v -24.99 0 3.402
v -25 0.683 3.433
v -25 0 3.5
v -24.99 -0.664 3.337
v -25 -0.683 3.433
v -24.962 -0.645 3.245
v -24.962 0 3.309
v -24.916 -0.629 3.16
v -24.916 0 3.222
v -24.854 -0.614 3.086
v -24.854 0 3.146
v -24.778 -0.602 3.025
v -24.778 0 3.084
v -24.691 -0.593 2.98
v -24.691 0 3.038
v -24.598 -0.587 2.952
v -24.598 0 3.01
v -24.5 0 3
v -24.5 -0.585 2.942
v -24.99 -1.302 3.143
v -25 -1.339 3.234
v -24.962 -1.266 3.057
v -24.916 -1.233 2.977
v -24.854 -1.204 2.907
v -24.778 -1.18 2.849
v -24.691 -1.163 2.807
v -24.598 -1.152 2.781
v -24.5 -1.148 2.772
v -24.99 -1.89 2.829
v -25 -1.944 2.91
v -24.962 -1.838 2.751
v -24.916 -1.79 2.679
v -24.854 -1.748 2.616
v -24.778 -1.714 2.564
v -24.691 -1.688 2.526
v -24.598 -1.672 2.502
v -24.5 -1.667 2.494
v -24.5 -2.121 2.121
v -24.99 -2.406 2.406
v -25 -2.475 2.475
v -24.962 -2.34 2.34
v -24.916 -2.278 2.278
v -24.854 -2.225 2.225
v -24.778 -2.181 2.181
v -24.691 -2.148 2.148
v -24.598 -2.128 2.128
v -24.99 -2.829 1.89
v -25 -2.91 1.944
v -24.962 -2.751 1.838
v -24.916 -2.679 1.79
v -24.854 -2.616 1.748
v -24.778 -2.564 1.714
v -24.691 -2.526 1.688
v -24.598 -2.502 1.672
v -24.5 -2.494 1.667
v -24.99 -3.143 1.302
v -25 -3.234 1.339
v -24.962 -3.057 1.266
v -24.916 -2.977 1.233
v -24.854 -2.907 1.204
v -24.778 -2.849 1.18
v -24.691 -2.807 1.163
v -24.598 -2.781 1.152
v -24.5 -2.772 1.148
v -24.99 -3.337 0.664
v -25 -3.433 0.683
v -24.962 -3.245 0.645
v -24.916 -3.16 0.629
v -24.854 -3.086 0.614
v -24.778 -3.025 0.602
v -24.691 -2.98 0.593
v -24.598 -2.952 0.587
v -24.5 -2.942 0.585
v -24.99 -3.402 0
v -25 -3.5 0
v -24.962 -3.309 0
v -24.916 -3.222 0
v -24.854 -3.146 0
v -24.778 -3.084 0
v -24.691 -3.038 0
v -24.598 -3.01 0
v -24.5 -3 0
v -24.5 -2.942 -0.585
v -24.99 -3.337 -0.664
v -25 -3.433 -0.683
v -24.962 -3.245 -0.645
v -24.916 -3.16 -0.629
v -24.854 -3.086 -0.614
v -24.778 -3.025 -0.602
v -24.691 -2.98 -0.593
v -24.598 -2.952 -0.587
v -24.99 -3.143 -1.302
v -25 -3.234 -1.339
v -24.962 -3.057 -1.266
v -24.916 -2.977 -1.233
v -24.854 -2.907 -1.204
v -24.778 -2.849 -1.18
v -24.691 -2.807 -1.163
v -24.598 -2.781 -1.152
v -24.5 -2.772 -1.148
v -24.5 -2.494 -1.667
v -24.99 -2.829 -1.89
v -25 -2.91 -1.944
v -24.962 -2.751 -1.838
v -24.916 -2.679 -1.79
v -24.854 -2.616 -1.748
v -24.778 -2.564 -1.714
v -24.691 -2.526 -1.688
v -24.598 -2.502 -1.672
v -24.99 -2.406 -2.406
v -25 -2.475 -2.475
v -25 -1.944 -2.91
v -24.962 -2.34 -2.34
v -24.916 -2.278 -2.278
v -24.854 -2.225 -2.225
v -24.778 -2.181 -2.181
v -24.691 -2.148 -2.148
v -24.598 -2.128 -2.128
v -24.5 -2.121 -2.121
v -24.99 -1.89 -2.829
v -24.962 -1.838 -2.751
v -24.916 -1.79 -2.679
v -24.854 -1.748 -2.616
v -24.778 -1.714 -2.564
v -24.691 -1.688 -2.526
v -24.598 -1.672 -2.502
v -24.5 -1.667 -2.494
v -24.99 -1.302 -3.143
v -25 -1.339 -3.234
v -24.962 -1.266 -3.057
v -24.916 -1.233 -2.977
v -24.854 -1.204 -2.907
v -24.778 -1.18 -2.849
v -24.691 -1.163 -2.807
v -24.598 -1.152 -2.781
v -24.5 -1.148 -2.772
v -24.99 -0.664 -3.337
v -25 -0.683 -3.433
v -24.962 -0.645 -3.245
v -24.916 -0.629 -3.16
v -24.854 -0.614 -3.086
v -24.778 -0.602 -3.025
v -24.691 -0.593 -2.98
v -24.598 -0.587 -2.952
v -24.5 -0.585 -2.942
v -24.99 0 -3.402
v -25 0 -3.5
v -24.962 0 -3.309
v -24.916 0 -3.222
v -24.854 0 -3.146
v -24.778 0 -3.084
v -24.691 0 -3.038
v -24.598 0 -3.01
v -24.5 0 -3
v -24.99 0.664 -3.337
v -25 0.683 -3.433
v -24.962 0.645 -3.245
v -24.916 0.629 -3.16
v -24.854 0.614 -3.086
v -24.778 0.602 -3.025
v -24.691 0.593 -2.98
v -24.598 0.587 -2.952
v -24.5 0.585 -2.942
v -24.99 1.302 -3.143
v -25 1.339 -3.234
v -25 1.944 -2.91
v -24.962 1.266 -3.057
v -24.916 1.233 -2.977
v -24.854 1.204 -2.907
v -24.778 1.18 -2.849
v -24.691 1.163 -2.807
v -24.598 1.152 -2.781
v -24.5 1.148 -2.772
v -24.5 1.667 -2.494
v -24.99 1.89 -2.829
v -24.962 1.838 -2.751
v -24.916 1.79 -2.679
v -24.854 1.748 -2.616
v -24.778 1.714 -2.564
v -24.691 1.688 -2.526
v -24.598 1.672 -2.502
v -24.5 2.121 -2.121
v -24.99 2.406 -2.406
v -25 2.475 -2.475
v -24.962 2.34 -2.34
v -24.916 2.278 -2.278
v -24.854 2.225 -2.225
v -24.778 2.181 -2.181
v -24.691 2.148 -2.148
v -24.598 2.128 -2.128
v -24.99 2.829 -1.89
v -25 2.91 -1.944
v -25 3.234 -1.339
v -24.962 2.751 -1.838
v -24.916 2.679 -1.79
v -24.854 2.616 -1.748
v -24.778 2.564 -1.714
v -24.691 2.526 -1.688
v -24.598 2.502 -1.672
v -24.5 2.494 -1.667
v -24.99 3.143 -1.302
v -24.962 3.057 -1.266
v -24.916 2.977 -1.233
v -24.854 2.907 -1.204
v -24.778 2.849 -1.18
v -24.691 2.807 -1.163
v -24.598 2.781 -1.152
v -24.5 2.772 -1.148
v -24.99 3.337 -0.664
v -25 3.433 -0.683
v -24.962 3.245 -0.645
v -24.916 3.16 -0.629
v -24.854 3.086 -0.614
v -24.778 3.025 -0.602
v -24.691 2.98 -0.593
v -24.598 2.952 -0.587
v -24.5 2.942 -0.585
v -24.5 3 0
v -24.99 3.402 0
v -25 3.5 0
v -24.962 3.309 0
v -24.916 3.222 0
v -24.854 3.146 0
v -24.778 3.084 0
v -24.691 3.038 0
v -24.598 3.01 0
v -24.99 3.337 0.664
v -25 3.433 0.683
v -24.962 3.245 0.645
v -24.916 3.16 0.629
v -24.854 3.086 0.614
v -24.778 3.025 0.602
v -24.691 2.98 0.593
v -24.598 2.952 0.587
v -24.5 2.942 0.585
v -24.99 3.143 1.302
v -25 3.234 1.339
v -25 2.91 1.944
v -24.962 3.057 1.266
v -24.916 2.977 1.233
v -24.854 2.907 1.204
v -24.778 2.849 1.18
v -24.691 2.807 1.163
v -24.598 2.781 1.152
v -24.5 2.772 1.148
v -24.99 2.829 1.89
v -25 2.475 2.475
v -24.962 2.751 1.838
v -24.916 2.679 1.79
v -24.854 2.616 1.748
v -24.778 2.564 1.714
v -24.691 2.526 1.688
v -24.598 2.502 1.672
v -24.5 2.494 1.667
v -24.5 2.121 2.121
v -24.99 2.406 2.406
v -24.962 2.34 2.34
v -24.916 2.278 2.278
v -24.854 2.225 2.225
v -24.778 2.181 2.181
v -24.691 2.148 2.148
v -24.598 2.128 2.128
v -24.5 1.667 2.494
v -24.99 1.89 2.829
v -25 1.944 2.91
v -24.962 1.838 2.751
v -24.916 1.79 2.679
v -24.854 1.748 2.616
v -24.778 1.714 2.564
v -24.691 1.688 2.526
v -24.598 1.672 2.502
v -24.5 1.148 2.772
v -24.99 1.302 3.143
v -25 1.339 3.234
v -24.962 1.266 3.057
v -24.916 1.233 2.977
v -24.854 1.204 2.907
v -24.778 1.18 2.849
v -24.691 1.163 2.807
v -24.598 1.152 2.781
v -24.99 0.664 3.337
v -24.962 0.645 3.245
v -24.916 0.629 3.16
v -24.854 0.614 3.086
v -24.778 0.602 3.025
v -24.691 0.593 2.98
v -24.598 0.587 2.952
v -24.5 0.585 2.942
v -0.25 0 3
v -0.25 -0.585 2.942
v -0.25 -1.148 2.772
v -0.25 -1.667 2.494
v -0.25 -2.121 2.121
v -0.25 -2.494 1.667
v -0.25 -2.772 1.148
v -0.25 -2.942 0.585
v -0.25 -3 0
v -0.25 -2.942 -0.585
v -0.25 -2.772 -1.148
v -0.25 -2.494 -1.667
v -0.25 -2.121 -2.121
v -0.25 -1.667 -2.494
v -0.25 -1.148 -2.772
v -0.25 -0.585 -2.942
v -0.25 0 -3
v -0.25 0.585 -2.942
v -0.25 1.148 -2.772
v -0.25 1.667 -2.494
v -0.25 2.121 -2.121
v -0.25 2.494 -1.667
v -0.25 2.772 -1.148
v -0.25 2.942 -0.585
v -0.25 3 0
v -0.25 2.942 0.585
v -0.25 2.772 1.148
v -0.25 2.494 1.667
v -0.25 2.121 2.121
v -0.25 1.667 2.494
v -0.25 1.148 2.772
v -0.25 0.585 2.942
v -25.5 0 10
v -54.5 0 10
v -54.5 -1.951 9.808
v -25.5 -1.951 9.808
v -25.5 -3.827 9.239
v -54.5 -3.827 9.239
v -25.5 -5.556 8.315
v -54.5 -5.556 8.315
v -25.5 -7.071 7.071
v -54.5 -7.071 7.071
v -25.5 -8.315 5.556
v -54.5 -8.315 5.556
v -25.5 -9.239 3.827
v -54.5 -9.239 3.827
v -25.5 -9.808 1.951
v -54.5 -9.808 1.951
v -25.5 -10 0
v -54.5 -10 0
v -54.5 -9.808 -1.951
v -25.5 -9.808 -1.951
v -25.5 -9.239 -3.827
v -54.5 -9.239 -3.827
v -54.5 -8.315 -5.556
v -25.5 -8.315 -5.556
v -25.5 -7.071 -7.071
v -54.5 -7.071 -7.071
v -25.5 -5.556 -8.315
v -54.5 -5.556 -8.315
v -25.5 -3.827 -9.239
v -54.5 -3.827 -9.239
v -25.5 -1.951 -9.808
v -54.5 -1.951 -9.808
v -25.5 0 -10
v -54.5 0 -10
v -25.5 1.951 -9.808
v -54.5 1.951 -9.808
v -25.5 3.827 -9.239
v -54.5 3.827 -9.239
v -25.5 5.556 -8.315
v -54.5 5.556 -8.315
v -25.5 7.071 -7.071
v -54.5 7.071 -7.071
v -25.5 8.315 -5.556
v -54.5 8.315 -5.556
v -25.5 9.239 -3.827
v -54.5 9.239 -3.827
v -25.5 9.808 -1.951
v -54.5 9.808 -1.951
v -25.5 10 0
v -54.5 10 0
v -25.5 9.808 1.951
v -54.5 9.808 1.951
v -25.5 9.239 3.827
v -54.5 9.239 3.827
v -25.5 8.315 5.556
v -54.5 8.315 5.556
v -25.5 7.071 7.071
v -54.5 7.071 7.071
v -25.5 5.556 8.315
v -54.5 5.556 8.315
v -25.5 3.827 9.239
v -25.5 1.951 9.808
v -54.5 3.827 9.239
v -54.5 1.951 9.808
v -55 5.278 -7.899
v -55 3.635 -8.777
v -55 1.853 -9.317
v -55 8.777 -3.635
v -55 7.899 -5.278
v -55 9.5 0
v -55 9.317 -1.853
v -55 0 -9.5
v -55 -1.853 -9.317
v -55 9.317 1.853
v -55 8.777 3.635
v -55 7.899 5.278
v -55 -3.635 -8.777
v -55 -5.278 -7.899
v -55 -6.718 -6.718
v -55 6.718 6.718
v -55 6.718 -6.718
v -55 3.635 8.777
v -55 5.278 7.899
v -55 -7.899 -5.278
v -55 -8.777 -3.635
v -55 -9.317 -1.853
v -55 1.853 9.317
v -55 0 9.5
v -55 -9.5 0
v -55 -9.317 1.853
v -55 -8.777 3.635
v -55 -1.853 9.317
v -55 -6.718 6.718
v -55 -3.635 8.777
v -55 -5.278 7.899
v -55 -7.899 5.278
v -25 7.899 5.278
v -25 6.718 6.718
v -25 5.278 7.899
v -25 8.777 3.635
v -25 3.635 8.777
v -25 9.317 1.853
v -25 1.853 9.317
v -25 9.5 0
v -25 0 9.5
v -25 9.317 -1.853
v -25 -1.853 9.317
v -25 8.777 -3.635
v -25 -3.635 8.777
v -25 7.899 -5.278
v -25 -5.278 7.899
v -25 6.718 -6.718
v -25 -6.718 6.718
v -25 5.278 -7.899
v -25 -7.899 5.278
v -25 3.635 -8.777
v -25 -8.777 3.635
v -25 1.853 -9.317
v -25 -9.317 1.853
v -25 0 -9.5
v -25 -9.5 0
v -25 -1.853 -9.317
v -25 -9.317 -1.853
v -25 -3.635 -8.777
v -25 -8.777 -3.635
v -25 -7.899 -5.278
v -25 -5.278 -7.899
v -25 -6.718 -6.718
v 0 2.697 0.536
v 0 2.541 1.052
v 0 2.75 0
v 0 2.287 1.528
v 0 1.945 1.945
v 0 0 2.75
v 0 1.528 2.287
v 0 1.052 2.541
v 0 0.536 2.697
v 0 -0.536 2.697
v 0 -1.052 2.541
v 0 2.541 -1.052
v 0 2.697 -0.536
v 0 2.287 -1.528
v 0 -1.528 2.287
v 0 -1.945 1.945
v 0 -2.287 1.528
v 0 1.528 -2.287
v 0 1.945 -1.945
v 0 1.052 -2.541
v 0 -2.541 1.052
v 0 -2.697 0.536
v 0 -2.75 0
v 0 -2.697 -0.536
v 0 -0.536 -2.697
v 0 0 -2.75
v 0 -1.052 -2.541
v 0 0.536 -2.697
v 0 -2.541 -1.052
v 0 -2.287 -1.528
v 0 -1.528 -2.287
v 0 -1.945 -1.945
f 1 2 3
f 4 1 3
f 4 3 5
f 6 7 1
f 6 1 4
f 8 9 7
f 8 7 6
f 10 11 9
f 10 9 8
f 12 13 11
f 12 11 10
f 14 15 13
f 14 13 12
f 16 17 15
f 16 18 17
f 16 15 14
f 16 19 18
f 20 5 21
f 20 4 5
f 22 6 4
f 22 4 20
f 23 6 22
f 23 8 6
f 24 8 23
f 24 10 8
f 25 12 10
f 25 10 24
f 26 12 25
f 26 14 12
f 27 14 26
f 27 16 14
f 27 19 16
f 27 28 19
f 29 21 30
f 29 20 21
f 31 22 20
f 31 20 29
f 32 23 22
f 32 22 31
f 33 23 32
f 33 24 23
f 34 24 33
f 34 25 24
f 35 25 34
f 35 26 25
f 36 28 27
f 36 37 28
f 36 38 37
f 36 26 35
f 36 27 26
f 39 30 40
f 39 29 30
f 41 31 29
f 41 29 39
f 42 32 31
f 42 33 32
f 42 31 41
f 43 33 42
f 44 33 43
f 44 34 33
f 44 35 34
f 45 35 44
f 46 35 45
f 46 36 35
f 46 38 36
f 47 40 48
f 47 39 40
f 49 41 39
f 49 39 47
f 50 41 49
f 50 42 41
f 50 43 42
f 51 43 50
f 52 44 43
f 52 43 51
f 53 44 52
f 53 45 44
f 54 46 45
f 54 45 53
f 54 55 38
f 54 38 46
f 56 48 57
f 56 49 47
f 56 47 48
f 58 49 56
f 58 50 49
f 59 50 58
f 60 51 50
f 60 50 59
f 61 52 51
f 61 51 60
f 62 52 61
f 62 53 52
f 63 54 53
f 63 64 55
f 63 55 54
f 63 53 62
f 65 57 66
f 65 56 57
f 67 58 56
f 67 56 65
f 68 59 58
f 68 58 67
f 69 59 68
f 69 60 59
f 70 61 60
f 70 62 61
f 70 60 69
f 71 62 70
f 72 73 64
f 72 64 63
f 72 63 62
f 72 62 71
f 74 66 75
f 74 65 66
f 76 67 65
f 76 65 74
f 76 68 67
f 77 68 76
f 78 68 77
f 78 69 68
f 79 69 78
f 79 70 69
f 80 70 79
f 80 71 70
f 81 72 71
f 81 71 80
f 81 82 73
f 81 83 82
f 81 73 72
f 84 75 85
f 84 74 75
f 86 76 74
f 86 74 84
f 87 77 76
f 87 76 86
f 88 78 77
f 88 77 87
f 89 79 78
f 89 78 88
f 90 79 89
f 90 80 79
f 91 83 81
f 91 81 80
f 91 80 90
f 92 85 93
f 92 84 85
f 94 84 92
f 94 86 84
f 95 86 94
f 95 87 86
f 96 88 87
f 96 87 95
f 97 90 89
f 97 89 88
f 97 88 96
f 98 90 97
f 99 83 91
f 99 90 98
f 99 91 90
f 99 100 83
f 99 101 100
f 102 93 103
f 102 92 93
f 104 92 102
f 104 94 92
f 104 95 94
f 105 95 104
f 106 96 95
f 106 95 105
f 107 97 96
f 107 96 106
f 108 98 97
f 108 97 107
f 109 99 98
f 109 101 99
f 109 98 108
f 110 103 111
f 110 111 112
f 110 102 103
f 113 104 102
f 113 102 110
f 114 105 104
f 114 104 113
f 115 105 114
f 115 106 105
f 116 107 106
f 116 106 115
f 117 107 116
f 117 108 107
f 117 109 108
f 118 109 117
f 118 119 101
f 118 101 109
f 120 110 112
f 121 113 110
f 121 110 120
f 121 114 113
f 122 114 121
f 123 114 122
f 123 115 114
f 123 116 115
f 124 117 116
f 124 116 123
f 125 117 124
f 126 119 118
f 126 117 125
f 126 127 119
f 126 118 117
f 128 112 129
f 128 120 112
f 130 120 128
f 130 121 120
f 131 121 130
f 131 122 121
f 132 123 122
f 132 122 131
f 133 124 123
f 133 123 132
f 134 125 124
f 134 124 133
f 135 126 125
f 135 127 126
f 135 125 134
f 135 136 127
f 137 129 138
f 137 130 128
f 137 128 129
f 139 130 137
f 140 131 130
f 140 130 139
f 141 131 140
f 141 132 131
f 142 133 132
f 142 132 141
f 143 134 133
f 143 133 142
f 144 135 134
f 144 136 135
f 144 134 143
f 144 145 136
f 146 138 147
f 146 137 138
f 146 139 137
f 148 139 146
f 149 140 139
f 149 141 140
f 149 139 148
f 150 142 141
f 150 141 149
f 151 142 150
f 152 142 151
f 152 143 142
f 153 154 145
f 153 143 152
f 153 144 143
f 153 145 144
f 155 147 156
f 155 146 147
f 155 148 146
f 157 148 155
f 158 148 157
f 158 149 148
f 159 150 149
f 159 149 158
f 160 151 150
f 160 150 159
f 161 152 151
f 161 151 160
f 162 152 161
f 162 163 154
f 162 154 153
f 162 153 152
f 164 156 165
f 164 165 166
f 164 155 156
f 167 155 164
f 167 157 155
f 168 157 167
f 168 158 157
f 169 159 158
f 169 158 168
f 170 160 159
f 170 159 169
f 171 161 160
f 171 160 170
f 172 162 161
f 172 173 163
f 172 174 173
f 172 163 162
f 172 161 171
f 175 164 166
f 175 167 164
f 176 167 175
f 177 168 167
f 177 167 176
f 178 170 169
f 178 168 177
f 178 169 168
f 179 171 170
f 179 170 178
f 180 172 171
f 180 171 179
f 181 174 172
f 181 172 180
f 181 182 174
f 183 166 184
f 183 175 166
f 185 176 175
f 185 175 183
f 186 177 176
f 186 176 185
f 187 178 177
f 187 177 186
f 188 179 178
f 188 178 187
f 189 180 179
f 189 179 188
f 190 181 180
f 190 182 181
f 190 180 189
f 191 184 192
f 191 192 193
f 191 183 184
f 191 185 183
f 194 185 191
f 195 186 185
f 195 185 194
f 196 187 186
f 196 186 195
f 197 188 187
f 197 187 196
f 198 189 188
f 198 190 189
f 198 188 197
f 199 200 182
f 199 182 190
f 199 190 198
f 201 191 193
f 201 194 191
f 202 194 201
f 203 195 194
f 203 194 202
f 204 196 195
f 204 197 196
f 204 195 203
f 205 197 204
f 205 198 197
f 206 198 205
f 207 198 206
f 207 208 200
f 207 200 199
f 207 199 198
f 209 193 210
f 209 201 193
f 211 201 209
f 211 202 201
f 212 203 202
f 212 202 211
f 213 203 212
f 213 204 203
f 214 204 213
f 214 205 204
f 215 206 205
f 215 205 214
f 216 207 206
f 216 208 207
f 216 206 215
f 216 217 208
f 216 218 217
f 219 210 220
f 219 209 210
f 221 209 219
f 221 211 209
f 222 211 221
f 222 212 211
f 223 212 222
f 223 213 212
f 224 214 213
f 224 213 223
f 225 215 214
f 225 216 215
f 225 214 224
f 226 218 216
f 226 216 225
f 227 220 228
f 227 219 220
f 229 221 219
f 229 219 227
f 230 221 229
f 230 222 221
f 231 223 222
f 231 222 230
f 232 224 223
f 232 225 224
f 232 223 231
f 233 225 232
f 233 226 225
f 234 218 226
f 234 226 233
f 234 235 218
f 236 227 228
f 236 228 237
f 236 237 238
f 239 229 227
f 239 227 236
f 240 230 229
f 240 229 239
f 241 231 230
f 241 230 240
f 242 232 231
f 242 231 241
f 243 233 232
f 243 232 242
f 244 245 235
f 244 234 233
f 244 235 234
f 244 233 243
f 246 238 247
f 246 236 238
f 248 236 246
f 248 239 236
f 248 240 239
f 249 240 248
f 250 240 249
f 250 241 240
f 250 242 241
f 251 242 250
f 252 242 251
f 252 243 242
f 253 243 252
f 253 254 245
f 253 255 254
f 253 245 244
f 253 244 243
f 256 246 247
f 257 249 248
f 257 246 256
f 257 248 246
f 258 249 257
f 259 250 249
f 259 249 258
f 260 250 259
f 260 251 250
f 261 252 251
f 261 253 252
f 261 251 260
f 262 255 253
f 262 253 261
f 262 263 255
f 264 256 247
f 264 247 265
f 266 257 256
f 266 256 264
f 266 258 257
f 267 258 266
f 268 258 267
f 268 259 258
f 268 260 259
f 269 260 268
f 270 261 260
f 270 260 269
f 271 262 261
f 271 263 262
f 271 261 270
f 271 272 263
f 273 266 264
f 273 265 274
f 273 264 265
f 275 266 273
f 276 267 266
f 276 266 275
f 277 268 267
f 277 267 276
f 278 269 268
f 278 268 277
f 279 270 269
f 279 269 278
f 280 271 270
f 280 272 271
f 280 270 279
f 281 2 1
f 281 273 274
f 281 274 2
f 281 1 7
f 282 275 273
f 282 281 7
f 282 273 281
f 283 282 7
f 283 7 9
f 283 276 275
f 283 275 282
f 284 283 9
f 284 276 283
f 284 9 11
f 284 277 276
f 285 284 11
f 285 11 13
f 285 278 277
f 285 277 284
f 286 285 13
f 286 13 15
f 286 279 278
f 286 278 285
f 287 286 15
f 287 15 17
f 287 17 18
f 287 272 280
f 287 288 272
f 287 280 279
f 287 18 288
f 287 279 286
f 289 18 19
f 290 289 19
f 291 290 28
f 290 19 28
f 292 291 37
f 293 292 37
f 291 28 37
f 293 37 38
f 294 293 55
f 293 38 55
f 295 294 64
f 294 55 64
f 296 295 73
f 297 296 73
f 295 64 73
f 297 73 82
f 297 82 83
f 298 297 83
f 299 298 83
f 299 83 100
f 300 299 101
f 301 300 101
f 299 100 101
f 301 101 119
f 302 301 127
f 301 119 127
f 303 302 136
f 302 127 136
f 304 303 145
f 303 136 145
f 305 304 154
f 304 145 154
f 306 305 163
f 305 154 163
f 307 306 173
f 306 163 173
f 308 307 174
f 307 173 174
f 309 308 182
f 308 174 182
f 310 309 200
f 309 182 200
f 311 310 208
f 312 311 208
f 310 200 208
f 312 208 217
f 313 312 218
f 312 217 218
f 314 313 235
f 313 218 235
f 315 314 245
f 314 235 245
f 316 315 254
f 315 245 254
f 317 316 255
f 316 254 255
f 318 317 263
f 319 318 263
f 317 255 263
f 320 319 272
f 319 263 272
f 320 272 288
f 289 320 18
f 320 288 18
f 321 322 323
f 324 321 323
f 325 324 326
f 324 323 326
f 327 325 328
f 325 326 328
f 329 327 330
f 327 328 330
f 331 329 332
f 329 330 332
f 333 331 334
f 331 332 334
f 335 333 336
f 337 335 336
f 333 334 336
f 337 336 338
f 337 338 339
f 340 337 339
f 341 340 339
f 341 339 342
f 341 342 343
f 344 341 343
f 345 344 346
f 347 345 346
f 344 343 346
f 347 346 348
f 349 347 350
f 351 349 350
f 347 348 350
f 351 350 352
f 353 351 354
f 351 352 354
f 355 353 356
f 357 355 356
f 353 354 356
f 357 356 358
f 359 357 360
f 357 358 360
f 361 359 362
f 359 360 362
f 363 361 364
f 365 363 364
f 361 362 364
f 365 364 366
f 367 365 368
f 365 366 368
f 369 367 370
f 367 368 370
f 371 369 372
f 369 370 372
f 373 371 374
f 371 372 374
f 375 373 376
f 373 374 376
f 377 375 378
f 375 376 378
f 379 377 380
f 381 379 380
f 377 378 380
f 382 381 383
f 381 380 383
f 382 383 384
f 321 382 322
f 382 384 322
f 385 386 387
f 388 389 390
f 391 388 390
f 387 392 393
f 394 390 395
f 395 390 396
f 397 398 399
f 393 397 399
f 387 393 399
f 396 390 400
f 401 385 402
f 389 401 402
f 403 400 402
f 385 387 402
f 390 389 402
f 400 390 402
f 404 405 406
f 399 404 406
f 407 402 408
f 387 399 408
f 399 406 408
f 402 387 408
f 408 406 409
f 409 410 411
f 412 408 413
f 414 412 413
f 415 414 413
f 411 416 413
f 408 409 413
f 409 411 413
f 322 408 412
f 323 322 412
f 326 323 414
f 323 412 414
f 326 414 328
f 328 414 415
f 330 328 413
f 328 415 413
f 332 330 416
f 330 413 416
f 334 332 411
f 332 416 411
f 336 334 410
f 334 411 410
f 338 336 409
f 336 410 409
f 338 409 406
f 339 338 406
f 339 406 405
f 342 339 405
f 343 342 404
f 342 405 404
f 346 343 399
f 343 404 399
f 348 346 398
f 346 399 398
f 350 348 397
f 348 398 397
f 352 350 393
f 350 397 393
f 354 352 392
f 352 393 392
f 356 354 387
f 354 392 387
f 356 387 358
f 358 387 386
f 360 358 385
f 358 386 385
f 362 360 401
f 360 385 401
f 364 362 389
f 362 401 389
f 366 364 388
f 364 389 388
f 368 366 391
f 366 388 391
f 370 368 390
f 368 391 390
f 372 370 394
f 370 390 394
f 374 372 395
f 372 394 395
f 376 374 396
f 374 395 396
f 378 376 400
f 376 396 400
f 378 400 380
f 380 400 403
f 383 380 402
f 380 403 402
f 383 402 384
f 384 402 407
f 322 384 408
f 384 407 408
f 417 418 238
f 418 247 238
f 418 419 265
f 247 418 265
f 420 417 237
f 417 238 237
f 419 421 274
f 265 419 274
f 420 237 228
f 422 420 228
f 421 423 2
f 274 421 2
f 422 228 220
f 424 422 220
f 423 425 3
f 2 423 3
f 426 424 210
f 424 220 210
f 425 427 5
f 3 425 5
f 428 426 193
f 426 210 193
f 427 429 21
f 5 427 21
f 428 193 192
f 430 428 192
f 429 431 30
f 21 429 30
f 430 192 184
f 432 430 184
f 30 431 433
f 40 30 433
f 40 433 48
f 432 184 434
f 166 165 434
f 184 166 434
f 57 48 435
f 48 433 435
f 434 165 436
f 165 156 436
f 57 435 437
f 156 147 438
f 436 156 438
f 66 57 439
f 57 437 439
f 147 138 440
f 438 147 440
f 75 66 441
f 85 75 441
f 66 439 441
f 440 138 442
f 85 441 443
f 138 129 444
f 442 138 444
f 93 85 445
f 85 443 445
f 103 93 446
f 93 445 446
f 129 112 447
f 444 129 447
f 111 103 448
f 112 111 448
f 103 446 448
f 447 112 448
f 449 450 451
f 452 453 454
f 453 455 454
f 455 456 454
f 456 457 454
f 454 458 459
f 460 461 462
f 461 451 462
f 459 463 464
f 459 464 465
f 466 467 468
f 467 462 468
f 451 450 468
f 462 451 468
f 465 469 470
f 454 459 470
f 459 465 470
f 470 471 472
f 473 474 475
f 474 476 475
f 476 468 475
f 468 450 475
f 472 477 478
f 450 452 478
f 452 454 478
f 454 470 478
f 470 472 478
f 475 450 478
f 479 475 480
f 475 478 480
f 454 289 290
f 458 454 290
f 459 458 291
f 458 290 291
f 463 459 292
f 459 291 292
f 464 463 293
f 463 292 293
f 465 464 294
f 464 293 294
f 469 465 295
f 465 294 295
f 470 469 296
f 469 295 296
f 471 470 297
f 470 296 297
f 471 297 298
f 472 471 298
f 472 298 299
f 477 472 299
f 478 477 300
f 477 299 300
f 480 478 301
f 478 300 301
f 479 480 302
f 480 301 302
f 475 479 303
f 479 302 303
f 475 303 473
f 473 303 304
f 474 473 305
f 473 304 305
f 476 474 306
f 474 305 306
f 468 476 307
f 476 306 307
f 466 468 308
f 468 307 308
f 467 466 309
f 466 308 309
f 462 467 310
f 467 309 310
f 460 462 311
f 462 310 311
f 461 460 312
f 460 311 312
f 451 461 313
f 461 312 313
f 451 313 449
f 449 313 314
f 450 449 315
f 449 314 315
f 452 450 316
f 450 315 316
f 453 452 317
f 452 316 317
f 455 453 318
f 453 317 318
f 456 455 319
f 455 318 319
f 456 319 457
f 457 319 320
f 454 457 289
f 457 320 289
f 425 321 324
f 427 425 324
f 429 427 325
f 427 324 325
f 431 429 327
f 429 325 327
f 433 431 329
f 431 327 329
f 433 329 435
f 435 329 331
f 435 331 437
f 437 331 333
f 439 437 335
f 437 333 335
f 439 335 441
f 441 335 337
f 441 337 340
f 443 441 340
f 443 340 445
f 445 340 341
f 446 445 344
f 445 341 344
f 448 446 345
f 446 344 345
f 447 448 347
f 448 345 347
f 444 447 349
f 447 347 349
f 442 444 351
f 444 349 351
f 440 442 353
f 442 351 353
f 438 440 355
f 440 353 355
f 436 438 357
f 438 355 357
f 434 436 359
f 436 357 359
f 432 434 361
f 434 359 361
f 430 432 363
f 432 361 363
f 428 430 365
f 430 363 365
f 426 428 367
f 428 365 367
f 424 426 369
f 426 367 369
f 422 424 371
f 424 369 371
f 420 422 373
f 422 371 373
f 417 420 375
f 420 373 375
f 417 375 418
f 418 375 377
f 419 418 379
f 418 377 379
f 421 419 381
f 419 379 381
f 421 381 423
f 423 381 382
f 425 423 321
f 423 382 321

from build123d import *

# Parameters (mm, degrees)
CHANFREIN1_SIZE = 0.25
CHANFREIN3_SIZE = 0.5
CONG_1_R        = 0.5


with BuildPart() as part:
    # Esquisse1 → Base-Révolution (revolve)
    with BuildSketch(Plane.XY, mode=Mode.PRIVATE) as base_r_volution_sk:
        Polygon((0, 0), (0, 3), (-25, 3), (-25, 10), (-55, 10), (-55, 0), align=None)
    revolve(base_r_volution_sk.sketch.rotate(Axis((-58.669915368, 0, 0), (1, 0, 0)), 90), axis=Axis((-58.669915368, 0, 0), (1, 0, 0)))

    # Chanfrein1
    chanfrein1_edges = [part.edges().sort_by_distance(p)[0] for p in [
        (0, 0, -3),
    ]]
    chamfer(chanfrein1_edges, length=CHANFREIN1_SIZE)

    # Chanfrein3
    chanfrein3_edges = [part.edges().sort_by_distance(p)[0] for p in [
        (-55, 0, -10),
        (-25, 0, -10),
    ]]
    chamfer(chanfrein3_edges, length=CHANFREIN3_SIZE)

    # Congé1
    cong_1_edges = [part.edges().sort_by_distance(p)[0] for p in [
        (-25, 0, -3),
    ]]
    fillet(cong_1_edges, radius=CONG_1_R)


solid = part.part
